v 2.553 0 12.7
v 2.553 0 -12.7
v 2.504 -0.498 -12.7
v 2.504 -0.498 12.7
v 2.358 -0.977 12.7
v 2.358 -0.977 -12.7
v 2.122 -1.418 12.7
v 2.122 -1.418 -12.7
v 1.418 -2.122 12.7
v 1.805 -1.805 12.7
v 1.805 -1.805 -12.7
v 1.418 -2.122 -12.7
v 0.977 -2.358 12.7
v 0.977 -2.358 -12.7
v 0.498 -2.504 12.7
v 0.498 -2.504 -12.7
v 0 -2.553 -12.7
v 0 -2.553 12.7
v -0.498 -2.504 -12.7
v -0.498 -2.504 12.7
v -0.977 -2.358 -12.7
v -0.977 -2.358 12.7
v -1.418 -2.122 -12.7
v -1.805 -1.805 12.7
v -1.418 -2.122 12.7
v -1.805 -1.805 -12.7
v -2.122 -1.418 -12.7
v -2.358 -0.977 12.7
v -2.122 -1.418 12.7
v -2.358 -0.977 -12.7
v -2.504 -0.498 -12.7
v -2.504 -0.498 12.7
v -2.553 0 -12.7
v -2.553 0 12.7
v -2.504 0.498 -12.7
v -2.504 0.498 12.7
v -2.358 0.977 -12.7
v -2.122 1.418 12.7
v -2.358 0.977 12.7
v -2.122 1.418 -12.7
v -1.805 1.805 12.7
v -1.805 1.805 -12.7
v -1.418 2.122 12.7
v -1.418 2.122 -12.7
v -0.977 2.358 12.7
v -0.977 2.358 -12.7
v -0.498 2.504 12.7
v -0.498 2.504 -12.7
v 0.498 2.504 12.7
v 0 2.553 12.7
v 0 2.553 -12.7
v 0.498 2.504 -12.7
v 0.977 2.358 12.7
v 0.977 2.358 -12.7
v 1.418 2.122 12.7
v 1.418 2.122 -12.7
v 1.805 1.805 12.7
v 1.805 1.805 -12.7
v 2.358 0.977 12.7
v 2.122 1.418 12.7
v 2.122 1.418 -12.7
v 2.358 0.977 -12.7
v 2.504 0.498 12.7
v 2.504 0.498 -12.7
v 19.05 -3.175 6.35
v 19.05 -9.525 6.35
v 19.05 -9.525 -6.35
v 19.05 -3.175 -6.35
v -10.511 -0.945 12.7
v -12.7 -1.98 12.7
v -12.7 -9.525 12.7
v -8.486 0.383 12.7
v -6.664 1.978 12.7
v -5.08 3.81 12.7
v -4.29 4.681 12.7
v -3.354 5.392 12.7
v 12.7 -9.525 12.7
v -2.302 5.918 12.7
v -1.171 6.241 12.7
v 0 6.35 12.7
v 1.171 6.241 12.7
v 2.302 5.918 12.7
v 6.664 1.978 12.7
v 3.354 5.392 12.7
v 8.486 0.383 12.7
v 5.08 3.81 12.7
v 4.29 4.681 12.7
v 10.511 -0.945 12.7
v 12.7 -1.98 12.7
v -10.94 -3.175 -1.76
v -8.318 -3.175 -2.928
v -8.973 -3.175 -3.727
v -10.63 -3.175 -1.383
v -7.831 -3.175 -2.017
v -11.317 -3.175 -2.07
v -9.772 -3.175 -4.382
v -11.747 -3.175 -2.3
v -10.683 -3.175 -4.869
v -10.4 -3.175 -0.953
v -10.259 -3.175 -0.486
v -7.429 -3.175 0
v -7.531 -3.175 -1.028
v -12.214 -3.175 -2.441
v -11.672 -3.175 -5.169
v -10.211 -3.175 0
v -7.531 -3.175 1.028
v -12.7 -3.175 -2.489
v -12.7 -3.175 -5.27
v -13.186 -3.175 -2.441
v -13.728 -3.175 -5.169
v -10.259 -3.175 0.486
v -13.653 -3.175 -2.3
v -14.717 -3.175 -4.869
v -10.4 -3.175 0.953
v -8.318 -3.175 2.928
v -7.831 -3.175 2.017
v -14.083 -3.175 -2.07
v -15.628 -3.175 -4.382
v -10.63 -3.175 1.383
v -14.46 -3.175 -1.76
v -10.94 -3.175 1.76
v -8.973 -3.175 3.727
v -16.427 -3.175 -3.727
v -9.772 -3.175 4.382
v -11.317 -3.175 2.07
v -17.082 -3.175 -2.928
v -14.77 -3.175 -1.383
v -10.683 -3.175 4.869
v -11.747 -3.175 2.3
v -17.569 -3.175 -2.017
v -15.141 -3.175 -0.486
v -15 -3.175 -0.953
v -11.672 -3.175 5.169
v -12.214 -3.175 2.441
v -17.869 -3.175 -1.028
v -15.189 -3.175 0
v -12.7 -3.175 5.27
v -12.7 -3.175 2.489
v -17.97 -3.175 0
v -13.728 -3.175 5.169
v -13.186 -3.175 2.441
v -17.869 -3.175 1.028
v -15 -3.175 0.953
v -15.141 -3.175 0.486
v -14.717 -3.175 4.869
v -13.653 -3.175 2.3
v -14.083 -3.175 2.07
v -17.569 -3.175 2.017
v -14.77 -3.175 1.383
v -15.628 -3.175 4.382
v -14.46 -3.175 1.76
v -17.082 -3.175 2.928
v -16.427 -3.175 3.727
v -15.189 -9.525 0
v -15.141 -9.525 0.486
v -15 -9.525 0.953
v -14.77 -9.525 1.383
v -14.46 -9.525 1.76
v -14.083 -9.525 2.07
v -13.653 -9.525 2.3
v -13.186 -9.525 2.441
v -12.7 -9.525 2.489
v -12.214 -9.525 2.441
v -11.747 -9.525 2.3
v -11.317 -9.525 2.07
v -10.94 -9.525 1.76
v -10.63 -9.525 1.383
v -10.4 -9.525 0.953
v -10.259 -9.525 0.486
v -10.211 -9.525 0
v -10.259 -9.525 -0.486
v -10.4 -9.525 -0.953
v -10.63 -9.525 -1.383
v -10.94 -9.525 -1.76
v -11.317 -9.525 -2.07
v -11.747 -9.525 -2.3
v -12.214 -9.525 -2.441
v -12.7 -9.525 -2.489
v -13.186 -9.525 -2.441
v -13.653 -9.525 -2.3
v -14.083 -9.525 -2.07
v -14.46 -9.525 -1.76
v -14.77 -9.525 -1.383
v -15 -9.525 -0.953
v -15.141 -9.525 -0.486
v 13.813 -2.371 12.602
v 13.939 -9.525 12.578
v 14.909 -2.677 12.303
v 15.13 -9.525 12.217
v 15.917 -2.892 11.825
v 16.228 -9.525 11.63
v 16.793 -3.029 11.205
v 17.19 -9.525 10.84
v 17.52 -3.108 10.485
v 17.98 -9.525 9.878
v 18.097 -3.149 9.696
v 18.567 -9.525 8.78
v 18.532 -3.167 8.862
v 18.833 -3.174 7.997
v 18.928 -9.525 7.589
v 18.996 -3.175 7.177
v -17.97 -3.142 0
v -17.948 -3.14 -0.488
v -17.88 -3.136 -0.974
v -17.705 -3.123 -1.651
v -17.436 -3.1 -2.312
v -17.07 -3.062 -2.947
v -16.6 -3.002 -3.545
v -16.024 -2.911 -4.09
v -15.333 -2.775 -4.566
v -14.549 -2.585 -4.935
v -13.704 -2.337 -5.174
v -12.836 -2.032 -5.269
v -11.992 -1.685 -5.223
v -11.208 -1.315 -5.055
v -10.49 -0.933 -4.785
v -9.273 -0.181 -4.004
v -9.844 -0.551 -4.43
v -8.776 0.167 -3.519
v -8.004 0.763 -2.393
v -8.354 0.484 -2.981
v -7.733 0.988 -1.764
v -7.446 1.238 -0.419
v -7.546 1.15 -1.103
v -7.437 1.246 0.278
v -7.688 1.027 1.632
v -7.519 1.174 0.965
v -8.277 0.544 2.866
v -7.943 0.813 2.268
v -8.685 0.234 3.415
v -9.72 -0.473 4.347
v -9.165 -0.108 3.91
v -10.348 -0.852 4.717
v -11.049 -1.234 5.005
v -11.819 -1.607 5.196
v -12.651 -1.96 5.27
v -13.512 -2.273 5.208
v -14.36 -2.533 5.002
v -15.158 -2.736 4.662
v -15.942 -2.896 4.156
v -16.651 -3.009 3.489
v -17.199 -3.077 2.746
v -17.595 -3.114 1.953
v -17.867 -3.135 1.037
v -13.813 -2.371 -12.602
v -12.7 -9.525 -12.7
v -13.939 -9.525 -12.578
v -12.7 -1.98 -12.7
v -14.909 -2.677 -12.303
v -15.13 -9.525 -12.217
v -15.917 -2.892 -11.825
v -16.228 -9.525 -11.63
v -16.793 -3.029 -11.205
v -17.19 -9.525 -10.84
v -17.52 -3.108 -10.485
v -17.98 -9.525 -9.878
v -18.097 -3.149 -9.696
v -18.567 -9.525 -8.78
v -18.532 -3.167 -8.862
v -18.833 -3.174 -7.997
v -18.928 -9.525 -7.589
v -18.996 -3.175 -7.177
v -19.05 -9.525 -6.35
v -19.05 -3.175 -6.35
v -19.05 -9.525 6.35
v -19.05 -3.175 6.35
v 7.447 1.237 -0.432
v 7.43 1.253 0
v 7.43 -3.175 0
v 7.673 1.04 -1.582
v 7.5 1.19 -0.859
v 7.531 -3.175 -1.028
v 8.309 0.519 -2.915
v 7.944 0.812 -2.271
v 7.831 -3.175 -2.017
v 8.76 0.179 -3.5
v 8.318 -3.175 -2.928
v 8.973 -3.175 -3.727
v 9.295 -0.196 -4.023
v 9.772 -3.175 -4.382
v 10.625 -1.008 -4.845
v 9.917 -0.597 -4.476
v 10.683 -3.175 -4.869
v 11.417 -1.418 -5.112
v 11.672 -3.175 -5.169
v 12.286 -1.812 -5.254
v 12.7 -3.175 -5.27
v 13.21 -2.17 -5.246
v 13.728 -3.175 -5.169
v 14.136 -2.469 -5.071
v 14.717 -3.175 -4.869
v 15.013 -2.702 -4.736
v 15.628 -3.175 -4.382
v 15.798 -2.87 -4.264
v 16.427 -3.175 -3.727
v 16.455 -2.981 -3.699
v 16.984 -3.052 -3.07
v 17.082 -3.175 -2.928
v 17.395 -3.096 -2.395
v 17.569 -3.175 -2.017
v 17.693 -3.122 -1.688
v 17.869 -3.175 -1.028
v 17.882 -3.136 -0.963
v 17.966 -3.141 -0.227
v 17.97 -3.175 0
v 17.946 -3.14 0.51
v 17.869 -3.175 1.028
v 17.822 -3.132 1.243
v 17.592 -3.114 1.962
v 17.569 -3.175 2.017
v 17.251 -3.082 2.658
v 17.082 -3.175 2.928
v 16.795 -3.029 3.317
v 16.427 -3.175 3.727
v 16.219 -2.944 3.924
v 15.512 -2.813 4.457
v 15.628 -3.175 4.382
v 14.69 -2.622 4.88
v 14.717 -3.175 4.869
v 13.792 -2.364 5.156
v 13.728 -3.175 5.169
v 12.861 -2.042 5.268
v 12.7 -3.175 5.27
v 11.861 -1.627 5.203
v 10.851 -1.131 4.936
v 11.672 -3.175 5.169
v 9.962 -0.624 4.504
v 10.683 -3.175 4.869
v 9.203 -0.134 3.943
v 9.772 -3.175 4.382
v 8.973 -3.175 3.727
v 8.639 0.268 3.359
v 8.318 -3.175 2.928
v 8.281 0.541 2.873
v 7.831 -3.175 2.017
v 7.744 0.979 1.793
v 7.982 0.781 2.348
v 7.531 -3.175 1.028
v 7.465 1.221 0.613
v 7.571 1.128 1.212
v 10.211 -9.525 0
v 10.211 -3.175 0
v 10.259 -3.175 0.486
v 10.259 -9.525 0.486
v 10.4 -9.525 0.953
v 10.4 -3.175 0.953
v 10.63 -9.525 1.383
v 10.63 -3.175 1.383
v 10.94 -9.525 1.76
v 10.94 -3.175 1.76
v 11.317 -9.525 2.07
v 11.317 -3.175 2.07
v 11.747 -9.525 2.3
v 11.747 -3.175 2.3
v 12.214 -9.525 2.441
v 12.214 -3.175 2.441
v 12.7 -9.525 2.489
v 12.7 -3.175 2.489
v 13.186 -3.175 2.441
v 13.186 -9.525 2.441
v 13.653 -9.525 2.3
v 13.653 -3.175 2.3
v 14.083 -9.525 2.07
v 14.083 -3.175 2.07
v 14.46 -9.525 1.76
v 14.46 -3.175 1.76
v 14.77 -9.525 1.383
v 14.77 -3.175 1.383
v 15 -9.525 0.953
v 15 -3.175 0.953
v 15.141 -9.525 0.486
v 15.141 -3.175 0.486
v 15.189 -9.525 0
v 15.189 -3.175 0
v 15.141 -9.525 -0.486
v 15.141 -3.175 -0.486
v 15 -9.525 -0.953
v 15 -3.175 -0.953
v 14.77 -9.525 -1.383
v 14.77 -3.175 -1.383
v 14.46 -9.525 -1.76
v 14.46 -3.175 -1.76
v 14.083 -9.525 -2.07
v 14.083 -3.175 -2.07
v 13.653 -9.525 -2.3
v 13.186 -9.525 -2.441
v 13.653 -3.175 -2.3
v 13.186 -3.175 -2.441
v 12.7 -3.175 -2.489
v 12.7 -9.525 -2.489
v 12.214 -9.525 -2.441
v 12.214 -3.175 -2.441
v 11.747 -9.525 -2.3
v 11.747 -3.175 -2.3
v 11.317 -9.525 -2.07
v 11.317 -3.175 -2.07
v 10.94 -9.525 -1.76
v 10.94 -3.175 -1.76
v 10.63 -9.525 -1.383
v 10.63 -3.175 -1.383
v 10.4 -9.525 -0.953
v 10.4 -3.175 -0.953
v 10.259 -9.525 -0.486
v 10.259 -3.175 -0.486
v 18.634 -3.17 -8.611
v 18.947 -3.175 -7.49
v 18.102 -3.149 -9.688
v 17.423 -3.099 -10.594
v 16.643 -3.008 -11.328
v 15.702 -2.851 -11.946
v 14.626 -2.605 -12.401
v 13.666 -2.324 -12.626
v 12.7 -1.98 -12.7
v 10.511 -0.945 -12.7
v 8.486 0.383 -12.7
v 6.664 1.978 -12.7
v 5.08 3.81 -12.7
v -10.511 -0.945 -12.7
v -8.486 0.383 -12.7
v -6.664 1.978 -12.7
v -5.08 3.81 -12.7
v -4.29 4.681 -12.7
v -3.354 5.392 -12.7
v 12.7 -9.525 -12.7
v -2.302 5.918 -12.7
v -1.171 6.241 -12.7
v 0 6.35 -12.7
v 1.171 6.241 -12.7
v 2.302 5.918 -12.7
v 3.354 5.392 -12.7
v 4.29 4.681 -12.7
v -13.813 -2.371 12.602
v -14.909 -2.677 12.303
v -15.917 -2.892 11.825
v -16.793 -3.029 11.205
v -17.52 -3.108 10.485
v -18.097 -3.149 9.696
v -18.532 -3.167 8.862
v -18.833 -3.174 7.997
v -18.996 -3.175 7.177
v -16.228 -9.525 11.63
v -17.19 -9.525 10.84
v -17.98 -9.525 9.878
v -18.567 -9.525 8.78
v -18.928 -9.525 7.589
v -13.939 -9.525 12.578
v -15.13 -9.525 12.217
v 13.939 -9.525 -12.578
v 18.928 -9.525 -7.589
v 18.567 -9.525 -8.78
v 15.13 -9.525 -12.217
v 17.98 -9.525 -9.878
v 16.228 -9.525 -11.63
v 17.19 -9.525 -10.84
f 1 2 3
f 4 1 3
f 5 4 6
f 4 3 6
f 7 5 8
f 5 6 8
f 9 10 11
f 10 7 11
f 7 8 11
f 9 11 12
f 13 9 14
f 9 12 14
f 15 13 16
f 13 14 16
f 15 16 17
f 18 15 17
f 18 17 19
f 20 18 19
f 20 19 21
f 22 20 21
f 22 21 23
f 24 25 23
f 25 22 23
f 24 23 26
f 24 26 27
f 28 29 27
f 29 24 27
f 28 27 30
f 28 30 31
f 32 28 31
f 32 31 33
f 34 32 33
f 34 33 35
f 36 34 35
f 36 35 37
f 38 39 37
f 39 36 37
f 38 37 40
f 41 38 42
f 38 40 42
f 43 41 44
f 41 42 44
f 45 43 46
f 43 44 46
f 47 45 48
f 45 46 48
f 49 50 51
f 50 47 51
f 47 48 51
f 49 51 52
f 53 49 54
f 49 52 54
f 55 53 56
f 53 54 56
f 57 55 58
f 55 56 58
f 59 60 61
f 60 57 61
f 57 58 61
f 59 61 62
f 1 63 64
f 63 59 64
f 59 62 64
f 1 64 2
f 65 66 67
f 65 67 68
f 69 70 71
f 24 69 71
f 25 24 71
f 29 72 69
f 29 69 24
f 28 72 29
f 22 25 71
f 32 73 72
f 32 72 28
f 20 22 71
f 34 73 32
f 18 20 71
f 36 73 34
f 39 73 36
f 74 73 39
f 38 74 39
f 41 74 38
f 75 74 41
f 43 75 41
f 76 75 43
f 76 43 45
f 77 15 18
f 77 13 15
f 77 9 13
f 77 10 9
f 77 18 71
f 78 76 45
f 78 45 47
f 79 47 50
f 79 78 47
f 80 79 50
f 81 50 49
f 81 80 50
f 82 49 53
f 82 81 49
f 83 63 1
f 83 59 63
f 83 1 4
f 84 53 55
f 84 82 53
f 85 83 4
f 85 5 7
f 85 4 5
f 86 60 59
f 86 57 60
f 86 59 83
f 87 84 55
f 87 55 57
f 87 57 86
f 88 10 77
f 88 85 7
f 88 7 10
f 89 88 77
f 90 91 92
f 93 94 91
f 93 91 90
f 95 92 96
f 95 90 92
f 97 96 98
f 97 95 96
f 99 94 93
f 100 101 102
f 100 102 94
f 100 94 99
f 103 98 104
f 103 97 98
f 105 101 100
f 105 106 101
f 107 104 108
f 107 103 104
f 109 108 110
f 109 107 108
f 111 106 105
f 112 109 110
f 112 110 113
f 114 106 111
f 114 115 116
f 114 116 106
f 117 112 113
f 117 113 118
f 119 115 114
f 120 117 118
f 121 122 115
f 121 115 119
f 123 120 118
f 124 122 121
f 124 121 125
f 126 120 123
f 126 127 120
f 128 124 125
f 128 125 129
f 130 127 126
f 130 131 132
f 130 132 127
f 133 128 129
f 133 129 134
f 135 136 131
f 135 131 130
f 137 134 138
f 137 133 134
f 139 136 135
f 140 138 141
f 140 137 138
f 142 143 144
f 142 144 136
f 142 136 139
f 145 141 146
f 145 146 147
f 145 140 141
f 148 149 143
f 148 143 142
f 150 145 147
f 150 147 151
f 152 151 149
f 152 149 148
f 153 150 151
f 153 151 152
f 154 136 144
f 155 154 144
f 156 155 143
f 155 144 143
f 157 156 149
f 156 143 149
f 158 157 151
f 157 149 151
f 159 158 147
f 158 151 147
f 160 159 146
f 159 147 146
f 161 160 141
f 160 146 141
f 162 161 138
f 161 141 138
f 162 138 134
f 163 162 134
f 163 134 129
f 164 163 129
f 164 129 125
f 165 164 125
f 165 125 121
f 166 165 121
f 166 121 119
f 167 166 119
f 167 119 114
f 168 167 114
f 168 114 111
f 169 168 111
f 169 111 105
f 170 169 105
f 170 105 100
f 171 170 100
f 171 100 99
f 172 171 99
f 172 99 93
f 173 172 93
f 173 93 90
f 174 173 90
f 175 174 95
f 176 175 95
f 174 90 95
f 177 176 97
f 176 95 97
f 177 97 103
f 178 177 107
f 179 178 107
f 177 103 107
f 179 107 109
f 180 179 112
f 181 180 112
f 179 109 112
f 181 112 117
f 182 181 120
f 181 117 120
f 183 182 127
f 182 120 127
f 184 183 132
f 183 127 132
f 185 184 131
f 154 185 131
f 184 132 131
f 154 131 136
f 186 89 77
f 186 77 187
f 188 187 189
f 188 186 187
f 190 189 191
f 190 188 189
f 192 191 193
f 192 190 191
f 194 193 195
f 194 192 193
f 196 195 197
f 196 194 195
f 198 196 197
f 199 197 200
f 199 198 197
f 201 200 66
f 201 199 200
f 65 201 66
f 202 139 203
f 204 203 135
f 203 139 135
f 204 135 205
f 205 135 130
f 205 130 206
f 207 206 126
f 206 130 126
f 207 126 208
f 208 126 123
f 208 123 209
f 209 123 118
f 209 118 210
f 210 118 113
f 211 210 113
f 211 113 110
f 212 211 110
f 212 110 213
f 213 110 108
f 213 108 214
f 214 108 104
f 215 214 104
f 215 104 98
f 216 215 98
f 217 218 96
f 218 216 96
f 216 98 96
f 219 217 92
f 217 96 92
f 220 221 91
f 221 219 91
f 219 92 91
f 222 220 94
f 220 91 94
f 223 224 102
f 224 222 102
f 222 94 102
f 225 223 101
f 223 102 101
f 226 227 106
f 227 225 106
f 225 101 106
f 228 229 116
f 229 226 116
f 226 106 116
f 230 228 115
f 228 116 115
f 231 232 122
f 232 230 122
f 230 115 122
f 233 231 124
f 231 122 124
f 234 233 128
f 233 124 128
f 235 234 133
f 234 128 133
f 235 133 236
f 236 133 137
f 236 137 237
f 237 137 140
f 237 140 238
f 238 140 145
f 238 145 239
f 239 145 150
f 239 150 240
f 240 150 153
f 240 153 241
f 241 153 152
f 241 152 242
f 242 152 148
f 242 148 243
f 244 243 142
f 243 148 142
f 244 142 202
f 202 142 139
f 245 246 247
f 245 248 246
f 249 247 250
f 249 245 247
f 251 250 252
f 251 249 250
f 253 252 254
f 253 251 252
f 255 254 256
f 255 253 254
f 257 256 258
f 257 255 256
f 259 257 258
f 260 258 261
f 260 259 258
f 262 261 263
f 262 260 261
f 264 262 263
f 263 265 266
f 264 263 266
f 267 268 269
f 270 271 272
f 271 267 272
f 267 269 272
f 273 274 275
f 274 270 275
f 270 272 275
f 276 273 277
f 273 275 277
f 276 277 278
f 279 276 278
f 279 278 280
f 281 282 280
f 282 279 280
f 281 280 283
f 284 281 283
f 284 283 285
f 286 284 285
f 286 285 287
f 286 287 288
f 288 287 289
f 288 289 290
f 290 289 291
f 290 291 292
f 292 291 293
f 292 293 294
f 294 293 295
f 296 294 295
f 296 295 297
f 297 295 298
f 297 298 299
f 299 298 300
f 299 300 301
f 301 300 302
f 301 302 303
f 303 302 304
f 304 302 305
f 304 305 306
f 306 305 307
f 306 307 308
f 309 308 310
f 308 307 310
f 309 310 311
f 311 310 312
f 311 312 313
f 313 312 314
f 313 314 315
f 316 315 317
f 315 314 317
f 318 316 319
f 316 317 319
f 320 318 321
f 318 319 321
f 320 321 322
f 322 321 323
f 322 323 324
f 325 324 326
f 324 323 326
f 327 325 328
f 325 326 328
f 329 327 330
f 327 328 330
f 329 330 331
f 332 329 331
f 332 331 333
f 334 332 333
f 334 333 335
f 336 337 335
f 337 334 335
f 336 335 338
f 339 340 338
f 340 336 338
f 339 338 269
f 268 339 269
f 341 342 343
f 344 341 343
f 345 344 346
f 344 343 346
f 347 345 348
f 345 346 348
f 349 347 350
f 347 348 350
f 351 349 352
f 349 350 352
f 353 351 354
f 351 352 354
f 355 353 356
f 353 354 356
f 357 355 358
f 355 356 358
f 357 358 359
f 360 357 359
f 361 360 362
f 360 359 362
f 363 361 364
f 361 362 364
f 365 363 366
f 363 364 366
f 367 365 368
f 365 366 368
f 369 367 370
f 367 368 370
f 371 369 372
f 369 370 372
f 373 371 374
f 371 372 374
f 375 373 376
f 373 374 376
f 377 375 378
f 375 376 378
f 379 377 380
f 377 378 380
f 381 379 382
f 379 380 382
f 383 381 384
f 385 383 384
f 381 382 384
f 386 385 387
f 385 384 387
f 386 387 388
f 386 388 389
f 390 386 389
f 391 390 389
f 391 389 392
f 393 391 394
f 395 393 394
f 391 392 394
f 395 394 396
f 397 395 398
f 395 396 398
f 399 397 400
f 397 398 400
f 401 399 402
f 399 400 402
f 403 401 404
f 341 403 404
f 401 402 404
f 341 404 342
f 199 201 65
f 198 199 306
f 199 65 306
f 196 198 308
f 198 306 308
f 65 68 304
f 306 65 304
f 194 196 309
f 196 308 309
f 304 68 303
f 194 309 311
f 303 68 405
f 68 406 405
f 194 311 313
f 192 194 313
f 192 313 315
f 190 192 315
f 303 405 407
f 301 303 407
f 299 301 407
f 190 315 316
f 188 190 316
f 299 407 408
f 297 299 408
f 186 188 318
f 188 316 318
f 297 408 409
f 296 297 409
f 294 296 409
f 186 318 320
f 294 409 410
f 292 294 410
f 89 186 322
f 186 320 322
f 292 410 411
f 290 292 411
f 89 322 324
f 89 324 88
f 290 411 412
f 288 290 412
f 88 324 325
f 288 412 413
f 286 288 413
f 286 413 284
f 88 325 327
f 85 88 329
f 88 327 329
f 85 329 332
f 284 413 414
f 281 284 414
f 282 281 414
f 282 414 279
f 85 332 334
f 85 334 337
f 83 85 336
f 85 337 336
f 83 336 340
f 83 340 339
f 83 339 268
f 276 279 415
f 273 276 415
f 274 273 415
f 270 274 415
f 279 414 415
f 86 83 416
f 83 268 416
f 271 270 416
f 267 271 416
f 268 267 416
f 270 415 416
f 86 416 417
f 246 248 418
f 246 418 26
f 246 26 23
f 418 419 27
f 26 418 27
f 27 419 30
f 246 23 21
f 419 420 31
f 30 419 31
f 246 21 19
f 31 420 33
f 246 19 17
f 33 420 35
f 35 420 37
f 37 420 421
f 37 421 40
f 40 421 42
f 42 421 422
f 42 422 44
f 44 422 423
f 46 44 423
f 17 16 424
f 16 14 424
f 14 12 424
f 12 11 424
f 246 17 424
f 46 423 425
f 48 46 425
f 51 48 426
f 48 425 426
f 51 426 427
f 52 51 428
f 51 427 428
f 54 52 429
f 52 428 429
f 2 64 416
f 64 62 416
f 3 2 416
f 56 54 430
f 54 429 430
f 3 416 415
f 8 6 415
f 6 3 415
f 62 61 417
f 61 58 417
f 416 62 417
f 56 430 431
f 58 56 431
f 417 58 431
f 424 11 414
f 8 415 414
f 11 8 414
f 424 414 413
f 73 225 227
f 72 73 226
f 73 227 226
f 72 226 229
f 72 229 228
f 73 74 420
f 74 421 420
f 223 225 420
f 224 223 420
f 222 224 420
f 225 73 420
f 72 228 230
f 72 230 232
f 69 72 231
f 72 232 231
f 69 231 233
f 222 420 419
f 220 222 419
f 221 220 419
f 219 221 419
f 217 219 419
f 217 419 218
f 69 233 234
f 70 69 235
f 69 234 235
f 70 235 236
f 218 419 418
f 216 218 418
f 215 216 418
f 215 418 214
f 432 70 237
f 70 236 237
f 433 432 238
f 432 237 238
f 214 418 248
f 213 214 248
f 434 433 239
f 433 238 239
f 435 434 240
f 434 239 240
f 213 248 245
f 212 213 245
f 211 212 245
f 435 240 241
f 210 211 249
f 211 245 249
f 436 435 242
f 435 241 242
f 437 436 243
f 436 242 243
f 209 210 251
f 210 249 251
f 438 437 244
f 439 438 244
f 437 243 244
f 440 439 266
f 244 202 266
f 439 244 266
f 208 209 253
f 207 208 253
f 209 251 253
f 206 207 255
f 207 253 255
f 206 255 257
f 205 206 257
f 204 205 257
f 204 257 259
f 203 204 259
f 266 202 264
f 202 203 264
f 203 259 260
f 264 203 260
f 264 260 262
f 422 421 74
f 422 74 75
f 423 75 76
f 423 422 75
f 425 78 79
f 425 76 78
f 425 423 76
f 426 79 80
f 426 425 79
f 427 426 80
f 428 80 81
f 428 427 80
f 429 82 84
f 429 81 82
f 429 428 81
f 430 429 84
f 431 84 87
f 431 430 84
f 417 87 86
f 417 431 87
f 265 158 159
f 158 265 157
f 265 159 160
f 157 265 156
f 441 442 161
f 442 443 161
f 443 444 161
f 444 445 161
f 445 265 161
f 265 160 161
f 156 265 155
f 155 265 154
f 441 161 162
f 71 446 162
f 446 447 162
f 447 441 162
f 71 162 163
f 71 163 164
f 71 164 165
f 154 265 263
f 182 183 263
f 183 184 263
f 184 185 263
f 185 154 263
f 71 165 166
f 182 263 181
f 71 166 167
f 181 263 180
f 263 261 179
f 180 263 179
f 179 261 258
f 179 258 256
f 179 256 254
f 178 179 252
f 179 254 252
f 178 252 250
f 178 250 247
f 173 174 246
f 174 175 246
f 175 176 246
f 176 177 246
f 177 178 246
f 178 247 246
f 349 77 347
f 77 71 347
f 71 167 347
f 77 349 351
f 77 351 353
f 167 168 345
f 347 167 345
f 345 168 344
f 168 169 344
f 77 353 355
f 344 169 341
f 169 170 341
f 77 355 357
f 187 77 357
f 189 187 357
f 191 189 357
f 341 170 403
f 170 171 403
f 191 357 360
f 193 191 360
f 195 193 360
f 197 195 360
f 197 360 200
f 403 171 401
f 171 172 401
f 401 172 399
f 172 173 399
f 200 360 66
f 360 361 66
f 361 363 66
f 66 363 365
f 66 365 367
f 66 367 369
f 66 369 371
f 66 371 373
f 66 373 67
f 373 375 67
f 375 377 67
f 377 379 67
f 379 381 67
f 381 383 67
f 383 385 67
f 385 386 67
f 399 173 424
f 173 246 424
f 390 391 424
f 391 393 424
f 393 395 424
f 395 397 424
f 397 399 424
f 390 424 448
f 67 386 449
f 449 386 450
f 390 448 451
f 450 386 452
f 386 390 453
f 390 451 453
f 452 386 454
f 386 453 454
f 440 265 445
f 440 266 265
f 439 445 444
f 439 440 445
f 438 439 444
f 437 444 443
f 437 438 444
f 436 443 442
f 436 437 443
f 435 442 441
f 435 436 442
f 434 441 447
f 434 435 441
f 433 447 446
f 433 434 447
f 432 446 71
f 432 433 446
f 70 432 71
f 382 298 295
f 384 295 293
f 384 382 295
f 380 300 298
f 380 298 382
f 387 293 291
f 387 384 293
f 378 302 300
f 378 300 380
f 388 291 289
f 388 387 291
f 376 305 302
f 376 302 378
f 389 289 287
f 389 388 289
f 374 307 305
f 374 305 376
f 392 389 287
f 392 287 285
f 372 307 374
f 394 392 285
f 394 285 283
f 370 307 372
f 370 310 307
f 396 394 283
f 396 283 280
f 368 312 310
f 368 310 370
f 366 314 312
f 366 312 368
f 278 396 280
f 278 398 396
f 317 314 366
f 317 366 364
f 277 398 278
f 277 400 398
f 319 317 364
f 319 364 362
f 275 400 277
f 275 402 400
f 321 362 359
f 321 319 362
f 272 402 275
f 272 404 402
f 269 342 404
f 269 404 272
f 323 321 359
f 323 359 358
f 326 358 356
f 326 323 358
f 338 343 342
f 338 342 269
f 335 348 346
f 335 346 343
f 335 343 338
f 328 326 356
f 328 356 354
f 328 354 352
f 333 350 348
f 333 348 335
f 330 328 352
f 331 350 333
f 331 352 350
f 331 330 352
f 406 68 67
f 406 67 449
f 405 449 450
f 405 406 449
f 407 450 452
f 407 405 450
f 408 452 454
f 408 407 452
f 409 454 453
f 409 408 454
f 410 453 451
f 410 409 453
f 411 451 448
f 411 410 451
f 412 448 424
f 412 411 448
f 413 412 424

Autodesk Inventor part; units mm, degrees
ref_plane "YZ Plane" through (0, 0, 0) normal (1, 0, 0) x (0, 1, 0)
ref_plane "XZ Plane" through (0, 0, 0) normal (0, 1, 0) x (-1, 0, 0)
sketch "Sketch1" plane through (0, 0, 0) normal (0, 0, 1) x (1, 0, 0)
  circle A0 centre (0, 0) radius 9.525 construction
  circle A1 centre (0, 0) radius 2.5527
  arc A2 (5.08, 3.81) -> (-5.08, 3.81) centre (0, 0) ccw
  arc A3 (5.08, 3.81) -> (19.05, -3.175) centre (19.05, 14.2875) ccw
  arc A4 (-19.05, -3.175) -> (-5.08, 3.81) centre (-19.05, 14.2875) ccw
  line L0 (-19.05, -9.525) -> (19.05, -9.525)
  line L1 (19.05, -9.525) -> (19.05, -3.175)
  line L2 (-19.05, -9.525) -> (-19.05, -3.175)
  dimension "d0" = 19.05
  dimension "d1" = 5.1054
  dimension "d2" = 12.7
  dimension "d3" = 6.35
  dimension "d4" = 38.1
extrude "Extrusion1" add sketch "Sketch1" along normal mid plane 25.4
ref_plane "Work Plane1" through (19.05, -3.175, 0) normal (0, 1, 0) x (-1, 0, 0)
sketch "Sketch2" plane through (19.05, -3.175, 0) normal (0, 1, 0) x (-1, 0, 0)
  line L0 (38.1, -12.7) -> (38.1, 12.7) projected
  line L1 (38.1, 0) -> (0, 0)
  line L2 (0, -12.7) -> (0, 12.7) projected
  circle A0 centre (31.75, 0) radius 2.4892
  circle A1 centre (31.75, 0) radius 5.2705
  circle A2 centre (6.35, 0) radius 5.2705
  circle A3 centre (6.35, 0) radius 2.4892
  point P0 (19.05, 0)
  dimension "d7" = 4.9784
  dimension "d8" = 10.541
  dimension "d11" = 360
  dimension "d13" = 25.4
extrude "Extrusion2" cut sketch "Sketch2" against normal through all contours A0 L1 | L1 A0 | A3 L1 | L1 A3
extrude "Extrusion3" cut sketch "Sketch2" along normal blind 25.4
fillet "Fillet1" radius 6.35 4 edges at (-19.05, -6.35, 12.7) (-19.05, -6.35, -12.7) (19.05, -6.35, 12.7) (19.05, -6.35, -12.7)
properties part number "254 Billet Thrust Block"
